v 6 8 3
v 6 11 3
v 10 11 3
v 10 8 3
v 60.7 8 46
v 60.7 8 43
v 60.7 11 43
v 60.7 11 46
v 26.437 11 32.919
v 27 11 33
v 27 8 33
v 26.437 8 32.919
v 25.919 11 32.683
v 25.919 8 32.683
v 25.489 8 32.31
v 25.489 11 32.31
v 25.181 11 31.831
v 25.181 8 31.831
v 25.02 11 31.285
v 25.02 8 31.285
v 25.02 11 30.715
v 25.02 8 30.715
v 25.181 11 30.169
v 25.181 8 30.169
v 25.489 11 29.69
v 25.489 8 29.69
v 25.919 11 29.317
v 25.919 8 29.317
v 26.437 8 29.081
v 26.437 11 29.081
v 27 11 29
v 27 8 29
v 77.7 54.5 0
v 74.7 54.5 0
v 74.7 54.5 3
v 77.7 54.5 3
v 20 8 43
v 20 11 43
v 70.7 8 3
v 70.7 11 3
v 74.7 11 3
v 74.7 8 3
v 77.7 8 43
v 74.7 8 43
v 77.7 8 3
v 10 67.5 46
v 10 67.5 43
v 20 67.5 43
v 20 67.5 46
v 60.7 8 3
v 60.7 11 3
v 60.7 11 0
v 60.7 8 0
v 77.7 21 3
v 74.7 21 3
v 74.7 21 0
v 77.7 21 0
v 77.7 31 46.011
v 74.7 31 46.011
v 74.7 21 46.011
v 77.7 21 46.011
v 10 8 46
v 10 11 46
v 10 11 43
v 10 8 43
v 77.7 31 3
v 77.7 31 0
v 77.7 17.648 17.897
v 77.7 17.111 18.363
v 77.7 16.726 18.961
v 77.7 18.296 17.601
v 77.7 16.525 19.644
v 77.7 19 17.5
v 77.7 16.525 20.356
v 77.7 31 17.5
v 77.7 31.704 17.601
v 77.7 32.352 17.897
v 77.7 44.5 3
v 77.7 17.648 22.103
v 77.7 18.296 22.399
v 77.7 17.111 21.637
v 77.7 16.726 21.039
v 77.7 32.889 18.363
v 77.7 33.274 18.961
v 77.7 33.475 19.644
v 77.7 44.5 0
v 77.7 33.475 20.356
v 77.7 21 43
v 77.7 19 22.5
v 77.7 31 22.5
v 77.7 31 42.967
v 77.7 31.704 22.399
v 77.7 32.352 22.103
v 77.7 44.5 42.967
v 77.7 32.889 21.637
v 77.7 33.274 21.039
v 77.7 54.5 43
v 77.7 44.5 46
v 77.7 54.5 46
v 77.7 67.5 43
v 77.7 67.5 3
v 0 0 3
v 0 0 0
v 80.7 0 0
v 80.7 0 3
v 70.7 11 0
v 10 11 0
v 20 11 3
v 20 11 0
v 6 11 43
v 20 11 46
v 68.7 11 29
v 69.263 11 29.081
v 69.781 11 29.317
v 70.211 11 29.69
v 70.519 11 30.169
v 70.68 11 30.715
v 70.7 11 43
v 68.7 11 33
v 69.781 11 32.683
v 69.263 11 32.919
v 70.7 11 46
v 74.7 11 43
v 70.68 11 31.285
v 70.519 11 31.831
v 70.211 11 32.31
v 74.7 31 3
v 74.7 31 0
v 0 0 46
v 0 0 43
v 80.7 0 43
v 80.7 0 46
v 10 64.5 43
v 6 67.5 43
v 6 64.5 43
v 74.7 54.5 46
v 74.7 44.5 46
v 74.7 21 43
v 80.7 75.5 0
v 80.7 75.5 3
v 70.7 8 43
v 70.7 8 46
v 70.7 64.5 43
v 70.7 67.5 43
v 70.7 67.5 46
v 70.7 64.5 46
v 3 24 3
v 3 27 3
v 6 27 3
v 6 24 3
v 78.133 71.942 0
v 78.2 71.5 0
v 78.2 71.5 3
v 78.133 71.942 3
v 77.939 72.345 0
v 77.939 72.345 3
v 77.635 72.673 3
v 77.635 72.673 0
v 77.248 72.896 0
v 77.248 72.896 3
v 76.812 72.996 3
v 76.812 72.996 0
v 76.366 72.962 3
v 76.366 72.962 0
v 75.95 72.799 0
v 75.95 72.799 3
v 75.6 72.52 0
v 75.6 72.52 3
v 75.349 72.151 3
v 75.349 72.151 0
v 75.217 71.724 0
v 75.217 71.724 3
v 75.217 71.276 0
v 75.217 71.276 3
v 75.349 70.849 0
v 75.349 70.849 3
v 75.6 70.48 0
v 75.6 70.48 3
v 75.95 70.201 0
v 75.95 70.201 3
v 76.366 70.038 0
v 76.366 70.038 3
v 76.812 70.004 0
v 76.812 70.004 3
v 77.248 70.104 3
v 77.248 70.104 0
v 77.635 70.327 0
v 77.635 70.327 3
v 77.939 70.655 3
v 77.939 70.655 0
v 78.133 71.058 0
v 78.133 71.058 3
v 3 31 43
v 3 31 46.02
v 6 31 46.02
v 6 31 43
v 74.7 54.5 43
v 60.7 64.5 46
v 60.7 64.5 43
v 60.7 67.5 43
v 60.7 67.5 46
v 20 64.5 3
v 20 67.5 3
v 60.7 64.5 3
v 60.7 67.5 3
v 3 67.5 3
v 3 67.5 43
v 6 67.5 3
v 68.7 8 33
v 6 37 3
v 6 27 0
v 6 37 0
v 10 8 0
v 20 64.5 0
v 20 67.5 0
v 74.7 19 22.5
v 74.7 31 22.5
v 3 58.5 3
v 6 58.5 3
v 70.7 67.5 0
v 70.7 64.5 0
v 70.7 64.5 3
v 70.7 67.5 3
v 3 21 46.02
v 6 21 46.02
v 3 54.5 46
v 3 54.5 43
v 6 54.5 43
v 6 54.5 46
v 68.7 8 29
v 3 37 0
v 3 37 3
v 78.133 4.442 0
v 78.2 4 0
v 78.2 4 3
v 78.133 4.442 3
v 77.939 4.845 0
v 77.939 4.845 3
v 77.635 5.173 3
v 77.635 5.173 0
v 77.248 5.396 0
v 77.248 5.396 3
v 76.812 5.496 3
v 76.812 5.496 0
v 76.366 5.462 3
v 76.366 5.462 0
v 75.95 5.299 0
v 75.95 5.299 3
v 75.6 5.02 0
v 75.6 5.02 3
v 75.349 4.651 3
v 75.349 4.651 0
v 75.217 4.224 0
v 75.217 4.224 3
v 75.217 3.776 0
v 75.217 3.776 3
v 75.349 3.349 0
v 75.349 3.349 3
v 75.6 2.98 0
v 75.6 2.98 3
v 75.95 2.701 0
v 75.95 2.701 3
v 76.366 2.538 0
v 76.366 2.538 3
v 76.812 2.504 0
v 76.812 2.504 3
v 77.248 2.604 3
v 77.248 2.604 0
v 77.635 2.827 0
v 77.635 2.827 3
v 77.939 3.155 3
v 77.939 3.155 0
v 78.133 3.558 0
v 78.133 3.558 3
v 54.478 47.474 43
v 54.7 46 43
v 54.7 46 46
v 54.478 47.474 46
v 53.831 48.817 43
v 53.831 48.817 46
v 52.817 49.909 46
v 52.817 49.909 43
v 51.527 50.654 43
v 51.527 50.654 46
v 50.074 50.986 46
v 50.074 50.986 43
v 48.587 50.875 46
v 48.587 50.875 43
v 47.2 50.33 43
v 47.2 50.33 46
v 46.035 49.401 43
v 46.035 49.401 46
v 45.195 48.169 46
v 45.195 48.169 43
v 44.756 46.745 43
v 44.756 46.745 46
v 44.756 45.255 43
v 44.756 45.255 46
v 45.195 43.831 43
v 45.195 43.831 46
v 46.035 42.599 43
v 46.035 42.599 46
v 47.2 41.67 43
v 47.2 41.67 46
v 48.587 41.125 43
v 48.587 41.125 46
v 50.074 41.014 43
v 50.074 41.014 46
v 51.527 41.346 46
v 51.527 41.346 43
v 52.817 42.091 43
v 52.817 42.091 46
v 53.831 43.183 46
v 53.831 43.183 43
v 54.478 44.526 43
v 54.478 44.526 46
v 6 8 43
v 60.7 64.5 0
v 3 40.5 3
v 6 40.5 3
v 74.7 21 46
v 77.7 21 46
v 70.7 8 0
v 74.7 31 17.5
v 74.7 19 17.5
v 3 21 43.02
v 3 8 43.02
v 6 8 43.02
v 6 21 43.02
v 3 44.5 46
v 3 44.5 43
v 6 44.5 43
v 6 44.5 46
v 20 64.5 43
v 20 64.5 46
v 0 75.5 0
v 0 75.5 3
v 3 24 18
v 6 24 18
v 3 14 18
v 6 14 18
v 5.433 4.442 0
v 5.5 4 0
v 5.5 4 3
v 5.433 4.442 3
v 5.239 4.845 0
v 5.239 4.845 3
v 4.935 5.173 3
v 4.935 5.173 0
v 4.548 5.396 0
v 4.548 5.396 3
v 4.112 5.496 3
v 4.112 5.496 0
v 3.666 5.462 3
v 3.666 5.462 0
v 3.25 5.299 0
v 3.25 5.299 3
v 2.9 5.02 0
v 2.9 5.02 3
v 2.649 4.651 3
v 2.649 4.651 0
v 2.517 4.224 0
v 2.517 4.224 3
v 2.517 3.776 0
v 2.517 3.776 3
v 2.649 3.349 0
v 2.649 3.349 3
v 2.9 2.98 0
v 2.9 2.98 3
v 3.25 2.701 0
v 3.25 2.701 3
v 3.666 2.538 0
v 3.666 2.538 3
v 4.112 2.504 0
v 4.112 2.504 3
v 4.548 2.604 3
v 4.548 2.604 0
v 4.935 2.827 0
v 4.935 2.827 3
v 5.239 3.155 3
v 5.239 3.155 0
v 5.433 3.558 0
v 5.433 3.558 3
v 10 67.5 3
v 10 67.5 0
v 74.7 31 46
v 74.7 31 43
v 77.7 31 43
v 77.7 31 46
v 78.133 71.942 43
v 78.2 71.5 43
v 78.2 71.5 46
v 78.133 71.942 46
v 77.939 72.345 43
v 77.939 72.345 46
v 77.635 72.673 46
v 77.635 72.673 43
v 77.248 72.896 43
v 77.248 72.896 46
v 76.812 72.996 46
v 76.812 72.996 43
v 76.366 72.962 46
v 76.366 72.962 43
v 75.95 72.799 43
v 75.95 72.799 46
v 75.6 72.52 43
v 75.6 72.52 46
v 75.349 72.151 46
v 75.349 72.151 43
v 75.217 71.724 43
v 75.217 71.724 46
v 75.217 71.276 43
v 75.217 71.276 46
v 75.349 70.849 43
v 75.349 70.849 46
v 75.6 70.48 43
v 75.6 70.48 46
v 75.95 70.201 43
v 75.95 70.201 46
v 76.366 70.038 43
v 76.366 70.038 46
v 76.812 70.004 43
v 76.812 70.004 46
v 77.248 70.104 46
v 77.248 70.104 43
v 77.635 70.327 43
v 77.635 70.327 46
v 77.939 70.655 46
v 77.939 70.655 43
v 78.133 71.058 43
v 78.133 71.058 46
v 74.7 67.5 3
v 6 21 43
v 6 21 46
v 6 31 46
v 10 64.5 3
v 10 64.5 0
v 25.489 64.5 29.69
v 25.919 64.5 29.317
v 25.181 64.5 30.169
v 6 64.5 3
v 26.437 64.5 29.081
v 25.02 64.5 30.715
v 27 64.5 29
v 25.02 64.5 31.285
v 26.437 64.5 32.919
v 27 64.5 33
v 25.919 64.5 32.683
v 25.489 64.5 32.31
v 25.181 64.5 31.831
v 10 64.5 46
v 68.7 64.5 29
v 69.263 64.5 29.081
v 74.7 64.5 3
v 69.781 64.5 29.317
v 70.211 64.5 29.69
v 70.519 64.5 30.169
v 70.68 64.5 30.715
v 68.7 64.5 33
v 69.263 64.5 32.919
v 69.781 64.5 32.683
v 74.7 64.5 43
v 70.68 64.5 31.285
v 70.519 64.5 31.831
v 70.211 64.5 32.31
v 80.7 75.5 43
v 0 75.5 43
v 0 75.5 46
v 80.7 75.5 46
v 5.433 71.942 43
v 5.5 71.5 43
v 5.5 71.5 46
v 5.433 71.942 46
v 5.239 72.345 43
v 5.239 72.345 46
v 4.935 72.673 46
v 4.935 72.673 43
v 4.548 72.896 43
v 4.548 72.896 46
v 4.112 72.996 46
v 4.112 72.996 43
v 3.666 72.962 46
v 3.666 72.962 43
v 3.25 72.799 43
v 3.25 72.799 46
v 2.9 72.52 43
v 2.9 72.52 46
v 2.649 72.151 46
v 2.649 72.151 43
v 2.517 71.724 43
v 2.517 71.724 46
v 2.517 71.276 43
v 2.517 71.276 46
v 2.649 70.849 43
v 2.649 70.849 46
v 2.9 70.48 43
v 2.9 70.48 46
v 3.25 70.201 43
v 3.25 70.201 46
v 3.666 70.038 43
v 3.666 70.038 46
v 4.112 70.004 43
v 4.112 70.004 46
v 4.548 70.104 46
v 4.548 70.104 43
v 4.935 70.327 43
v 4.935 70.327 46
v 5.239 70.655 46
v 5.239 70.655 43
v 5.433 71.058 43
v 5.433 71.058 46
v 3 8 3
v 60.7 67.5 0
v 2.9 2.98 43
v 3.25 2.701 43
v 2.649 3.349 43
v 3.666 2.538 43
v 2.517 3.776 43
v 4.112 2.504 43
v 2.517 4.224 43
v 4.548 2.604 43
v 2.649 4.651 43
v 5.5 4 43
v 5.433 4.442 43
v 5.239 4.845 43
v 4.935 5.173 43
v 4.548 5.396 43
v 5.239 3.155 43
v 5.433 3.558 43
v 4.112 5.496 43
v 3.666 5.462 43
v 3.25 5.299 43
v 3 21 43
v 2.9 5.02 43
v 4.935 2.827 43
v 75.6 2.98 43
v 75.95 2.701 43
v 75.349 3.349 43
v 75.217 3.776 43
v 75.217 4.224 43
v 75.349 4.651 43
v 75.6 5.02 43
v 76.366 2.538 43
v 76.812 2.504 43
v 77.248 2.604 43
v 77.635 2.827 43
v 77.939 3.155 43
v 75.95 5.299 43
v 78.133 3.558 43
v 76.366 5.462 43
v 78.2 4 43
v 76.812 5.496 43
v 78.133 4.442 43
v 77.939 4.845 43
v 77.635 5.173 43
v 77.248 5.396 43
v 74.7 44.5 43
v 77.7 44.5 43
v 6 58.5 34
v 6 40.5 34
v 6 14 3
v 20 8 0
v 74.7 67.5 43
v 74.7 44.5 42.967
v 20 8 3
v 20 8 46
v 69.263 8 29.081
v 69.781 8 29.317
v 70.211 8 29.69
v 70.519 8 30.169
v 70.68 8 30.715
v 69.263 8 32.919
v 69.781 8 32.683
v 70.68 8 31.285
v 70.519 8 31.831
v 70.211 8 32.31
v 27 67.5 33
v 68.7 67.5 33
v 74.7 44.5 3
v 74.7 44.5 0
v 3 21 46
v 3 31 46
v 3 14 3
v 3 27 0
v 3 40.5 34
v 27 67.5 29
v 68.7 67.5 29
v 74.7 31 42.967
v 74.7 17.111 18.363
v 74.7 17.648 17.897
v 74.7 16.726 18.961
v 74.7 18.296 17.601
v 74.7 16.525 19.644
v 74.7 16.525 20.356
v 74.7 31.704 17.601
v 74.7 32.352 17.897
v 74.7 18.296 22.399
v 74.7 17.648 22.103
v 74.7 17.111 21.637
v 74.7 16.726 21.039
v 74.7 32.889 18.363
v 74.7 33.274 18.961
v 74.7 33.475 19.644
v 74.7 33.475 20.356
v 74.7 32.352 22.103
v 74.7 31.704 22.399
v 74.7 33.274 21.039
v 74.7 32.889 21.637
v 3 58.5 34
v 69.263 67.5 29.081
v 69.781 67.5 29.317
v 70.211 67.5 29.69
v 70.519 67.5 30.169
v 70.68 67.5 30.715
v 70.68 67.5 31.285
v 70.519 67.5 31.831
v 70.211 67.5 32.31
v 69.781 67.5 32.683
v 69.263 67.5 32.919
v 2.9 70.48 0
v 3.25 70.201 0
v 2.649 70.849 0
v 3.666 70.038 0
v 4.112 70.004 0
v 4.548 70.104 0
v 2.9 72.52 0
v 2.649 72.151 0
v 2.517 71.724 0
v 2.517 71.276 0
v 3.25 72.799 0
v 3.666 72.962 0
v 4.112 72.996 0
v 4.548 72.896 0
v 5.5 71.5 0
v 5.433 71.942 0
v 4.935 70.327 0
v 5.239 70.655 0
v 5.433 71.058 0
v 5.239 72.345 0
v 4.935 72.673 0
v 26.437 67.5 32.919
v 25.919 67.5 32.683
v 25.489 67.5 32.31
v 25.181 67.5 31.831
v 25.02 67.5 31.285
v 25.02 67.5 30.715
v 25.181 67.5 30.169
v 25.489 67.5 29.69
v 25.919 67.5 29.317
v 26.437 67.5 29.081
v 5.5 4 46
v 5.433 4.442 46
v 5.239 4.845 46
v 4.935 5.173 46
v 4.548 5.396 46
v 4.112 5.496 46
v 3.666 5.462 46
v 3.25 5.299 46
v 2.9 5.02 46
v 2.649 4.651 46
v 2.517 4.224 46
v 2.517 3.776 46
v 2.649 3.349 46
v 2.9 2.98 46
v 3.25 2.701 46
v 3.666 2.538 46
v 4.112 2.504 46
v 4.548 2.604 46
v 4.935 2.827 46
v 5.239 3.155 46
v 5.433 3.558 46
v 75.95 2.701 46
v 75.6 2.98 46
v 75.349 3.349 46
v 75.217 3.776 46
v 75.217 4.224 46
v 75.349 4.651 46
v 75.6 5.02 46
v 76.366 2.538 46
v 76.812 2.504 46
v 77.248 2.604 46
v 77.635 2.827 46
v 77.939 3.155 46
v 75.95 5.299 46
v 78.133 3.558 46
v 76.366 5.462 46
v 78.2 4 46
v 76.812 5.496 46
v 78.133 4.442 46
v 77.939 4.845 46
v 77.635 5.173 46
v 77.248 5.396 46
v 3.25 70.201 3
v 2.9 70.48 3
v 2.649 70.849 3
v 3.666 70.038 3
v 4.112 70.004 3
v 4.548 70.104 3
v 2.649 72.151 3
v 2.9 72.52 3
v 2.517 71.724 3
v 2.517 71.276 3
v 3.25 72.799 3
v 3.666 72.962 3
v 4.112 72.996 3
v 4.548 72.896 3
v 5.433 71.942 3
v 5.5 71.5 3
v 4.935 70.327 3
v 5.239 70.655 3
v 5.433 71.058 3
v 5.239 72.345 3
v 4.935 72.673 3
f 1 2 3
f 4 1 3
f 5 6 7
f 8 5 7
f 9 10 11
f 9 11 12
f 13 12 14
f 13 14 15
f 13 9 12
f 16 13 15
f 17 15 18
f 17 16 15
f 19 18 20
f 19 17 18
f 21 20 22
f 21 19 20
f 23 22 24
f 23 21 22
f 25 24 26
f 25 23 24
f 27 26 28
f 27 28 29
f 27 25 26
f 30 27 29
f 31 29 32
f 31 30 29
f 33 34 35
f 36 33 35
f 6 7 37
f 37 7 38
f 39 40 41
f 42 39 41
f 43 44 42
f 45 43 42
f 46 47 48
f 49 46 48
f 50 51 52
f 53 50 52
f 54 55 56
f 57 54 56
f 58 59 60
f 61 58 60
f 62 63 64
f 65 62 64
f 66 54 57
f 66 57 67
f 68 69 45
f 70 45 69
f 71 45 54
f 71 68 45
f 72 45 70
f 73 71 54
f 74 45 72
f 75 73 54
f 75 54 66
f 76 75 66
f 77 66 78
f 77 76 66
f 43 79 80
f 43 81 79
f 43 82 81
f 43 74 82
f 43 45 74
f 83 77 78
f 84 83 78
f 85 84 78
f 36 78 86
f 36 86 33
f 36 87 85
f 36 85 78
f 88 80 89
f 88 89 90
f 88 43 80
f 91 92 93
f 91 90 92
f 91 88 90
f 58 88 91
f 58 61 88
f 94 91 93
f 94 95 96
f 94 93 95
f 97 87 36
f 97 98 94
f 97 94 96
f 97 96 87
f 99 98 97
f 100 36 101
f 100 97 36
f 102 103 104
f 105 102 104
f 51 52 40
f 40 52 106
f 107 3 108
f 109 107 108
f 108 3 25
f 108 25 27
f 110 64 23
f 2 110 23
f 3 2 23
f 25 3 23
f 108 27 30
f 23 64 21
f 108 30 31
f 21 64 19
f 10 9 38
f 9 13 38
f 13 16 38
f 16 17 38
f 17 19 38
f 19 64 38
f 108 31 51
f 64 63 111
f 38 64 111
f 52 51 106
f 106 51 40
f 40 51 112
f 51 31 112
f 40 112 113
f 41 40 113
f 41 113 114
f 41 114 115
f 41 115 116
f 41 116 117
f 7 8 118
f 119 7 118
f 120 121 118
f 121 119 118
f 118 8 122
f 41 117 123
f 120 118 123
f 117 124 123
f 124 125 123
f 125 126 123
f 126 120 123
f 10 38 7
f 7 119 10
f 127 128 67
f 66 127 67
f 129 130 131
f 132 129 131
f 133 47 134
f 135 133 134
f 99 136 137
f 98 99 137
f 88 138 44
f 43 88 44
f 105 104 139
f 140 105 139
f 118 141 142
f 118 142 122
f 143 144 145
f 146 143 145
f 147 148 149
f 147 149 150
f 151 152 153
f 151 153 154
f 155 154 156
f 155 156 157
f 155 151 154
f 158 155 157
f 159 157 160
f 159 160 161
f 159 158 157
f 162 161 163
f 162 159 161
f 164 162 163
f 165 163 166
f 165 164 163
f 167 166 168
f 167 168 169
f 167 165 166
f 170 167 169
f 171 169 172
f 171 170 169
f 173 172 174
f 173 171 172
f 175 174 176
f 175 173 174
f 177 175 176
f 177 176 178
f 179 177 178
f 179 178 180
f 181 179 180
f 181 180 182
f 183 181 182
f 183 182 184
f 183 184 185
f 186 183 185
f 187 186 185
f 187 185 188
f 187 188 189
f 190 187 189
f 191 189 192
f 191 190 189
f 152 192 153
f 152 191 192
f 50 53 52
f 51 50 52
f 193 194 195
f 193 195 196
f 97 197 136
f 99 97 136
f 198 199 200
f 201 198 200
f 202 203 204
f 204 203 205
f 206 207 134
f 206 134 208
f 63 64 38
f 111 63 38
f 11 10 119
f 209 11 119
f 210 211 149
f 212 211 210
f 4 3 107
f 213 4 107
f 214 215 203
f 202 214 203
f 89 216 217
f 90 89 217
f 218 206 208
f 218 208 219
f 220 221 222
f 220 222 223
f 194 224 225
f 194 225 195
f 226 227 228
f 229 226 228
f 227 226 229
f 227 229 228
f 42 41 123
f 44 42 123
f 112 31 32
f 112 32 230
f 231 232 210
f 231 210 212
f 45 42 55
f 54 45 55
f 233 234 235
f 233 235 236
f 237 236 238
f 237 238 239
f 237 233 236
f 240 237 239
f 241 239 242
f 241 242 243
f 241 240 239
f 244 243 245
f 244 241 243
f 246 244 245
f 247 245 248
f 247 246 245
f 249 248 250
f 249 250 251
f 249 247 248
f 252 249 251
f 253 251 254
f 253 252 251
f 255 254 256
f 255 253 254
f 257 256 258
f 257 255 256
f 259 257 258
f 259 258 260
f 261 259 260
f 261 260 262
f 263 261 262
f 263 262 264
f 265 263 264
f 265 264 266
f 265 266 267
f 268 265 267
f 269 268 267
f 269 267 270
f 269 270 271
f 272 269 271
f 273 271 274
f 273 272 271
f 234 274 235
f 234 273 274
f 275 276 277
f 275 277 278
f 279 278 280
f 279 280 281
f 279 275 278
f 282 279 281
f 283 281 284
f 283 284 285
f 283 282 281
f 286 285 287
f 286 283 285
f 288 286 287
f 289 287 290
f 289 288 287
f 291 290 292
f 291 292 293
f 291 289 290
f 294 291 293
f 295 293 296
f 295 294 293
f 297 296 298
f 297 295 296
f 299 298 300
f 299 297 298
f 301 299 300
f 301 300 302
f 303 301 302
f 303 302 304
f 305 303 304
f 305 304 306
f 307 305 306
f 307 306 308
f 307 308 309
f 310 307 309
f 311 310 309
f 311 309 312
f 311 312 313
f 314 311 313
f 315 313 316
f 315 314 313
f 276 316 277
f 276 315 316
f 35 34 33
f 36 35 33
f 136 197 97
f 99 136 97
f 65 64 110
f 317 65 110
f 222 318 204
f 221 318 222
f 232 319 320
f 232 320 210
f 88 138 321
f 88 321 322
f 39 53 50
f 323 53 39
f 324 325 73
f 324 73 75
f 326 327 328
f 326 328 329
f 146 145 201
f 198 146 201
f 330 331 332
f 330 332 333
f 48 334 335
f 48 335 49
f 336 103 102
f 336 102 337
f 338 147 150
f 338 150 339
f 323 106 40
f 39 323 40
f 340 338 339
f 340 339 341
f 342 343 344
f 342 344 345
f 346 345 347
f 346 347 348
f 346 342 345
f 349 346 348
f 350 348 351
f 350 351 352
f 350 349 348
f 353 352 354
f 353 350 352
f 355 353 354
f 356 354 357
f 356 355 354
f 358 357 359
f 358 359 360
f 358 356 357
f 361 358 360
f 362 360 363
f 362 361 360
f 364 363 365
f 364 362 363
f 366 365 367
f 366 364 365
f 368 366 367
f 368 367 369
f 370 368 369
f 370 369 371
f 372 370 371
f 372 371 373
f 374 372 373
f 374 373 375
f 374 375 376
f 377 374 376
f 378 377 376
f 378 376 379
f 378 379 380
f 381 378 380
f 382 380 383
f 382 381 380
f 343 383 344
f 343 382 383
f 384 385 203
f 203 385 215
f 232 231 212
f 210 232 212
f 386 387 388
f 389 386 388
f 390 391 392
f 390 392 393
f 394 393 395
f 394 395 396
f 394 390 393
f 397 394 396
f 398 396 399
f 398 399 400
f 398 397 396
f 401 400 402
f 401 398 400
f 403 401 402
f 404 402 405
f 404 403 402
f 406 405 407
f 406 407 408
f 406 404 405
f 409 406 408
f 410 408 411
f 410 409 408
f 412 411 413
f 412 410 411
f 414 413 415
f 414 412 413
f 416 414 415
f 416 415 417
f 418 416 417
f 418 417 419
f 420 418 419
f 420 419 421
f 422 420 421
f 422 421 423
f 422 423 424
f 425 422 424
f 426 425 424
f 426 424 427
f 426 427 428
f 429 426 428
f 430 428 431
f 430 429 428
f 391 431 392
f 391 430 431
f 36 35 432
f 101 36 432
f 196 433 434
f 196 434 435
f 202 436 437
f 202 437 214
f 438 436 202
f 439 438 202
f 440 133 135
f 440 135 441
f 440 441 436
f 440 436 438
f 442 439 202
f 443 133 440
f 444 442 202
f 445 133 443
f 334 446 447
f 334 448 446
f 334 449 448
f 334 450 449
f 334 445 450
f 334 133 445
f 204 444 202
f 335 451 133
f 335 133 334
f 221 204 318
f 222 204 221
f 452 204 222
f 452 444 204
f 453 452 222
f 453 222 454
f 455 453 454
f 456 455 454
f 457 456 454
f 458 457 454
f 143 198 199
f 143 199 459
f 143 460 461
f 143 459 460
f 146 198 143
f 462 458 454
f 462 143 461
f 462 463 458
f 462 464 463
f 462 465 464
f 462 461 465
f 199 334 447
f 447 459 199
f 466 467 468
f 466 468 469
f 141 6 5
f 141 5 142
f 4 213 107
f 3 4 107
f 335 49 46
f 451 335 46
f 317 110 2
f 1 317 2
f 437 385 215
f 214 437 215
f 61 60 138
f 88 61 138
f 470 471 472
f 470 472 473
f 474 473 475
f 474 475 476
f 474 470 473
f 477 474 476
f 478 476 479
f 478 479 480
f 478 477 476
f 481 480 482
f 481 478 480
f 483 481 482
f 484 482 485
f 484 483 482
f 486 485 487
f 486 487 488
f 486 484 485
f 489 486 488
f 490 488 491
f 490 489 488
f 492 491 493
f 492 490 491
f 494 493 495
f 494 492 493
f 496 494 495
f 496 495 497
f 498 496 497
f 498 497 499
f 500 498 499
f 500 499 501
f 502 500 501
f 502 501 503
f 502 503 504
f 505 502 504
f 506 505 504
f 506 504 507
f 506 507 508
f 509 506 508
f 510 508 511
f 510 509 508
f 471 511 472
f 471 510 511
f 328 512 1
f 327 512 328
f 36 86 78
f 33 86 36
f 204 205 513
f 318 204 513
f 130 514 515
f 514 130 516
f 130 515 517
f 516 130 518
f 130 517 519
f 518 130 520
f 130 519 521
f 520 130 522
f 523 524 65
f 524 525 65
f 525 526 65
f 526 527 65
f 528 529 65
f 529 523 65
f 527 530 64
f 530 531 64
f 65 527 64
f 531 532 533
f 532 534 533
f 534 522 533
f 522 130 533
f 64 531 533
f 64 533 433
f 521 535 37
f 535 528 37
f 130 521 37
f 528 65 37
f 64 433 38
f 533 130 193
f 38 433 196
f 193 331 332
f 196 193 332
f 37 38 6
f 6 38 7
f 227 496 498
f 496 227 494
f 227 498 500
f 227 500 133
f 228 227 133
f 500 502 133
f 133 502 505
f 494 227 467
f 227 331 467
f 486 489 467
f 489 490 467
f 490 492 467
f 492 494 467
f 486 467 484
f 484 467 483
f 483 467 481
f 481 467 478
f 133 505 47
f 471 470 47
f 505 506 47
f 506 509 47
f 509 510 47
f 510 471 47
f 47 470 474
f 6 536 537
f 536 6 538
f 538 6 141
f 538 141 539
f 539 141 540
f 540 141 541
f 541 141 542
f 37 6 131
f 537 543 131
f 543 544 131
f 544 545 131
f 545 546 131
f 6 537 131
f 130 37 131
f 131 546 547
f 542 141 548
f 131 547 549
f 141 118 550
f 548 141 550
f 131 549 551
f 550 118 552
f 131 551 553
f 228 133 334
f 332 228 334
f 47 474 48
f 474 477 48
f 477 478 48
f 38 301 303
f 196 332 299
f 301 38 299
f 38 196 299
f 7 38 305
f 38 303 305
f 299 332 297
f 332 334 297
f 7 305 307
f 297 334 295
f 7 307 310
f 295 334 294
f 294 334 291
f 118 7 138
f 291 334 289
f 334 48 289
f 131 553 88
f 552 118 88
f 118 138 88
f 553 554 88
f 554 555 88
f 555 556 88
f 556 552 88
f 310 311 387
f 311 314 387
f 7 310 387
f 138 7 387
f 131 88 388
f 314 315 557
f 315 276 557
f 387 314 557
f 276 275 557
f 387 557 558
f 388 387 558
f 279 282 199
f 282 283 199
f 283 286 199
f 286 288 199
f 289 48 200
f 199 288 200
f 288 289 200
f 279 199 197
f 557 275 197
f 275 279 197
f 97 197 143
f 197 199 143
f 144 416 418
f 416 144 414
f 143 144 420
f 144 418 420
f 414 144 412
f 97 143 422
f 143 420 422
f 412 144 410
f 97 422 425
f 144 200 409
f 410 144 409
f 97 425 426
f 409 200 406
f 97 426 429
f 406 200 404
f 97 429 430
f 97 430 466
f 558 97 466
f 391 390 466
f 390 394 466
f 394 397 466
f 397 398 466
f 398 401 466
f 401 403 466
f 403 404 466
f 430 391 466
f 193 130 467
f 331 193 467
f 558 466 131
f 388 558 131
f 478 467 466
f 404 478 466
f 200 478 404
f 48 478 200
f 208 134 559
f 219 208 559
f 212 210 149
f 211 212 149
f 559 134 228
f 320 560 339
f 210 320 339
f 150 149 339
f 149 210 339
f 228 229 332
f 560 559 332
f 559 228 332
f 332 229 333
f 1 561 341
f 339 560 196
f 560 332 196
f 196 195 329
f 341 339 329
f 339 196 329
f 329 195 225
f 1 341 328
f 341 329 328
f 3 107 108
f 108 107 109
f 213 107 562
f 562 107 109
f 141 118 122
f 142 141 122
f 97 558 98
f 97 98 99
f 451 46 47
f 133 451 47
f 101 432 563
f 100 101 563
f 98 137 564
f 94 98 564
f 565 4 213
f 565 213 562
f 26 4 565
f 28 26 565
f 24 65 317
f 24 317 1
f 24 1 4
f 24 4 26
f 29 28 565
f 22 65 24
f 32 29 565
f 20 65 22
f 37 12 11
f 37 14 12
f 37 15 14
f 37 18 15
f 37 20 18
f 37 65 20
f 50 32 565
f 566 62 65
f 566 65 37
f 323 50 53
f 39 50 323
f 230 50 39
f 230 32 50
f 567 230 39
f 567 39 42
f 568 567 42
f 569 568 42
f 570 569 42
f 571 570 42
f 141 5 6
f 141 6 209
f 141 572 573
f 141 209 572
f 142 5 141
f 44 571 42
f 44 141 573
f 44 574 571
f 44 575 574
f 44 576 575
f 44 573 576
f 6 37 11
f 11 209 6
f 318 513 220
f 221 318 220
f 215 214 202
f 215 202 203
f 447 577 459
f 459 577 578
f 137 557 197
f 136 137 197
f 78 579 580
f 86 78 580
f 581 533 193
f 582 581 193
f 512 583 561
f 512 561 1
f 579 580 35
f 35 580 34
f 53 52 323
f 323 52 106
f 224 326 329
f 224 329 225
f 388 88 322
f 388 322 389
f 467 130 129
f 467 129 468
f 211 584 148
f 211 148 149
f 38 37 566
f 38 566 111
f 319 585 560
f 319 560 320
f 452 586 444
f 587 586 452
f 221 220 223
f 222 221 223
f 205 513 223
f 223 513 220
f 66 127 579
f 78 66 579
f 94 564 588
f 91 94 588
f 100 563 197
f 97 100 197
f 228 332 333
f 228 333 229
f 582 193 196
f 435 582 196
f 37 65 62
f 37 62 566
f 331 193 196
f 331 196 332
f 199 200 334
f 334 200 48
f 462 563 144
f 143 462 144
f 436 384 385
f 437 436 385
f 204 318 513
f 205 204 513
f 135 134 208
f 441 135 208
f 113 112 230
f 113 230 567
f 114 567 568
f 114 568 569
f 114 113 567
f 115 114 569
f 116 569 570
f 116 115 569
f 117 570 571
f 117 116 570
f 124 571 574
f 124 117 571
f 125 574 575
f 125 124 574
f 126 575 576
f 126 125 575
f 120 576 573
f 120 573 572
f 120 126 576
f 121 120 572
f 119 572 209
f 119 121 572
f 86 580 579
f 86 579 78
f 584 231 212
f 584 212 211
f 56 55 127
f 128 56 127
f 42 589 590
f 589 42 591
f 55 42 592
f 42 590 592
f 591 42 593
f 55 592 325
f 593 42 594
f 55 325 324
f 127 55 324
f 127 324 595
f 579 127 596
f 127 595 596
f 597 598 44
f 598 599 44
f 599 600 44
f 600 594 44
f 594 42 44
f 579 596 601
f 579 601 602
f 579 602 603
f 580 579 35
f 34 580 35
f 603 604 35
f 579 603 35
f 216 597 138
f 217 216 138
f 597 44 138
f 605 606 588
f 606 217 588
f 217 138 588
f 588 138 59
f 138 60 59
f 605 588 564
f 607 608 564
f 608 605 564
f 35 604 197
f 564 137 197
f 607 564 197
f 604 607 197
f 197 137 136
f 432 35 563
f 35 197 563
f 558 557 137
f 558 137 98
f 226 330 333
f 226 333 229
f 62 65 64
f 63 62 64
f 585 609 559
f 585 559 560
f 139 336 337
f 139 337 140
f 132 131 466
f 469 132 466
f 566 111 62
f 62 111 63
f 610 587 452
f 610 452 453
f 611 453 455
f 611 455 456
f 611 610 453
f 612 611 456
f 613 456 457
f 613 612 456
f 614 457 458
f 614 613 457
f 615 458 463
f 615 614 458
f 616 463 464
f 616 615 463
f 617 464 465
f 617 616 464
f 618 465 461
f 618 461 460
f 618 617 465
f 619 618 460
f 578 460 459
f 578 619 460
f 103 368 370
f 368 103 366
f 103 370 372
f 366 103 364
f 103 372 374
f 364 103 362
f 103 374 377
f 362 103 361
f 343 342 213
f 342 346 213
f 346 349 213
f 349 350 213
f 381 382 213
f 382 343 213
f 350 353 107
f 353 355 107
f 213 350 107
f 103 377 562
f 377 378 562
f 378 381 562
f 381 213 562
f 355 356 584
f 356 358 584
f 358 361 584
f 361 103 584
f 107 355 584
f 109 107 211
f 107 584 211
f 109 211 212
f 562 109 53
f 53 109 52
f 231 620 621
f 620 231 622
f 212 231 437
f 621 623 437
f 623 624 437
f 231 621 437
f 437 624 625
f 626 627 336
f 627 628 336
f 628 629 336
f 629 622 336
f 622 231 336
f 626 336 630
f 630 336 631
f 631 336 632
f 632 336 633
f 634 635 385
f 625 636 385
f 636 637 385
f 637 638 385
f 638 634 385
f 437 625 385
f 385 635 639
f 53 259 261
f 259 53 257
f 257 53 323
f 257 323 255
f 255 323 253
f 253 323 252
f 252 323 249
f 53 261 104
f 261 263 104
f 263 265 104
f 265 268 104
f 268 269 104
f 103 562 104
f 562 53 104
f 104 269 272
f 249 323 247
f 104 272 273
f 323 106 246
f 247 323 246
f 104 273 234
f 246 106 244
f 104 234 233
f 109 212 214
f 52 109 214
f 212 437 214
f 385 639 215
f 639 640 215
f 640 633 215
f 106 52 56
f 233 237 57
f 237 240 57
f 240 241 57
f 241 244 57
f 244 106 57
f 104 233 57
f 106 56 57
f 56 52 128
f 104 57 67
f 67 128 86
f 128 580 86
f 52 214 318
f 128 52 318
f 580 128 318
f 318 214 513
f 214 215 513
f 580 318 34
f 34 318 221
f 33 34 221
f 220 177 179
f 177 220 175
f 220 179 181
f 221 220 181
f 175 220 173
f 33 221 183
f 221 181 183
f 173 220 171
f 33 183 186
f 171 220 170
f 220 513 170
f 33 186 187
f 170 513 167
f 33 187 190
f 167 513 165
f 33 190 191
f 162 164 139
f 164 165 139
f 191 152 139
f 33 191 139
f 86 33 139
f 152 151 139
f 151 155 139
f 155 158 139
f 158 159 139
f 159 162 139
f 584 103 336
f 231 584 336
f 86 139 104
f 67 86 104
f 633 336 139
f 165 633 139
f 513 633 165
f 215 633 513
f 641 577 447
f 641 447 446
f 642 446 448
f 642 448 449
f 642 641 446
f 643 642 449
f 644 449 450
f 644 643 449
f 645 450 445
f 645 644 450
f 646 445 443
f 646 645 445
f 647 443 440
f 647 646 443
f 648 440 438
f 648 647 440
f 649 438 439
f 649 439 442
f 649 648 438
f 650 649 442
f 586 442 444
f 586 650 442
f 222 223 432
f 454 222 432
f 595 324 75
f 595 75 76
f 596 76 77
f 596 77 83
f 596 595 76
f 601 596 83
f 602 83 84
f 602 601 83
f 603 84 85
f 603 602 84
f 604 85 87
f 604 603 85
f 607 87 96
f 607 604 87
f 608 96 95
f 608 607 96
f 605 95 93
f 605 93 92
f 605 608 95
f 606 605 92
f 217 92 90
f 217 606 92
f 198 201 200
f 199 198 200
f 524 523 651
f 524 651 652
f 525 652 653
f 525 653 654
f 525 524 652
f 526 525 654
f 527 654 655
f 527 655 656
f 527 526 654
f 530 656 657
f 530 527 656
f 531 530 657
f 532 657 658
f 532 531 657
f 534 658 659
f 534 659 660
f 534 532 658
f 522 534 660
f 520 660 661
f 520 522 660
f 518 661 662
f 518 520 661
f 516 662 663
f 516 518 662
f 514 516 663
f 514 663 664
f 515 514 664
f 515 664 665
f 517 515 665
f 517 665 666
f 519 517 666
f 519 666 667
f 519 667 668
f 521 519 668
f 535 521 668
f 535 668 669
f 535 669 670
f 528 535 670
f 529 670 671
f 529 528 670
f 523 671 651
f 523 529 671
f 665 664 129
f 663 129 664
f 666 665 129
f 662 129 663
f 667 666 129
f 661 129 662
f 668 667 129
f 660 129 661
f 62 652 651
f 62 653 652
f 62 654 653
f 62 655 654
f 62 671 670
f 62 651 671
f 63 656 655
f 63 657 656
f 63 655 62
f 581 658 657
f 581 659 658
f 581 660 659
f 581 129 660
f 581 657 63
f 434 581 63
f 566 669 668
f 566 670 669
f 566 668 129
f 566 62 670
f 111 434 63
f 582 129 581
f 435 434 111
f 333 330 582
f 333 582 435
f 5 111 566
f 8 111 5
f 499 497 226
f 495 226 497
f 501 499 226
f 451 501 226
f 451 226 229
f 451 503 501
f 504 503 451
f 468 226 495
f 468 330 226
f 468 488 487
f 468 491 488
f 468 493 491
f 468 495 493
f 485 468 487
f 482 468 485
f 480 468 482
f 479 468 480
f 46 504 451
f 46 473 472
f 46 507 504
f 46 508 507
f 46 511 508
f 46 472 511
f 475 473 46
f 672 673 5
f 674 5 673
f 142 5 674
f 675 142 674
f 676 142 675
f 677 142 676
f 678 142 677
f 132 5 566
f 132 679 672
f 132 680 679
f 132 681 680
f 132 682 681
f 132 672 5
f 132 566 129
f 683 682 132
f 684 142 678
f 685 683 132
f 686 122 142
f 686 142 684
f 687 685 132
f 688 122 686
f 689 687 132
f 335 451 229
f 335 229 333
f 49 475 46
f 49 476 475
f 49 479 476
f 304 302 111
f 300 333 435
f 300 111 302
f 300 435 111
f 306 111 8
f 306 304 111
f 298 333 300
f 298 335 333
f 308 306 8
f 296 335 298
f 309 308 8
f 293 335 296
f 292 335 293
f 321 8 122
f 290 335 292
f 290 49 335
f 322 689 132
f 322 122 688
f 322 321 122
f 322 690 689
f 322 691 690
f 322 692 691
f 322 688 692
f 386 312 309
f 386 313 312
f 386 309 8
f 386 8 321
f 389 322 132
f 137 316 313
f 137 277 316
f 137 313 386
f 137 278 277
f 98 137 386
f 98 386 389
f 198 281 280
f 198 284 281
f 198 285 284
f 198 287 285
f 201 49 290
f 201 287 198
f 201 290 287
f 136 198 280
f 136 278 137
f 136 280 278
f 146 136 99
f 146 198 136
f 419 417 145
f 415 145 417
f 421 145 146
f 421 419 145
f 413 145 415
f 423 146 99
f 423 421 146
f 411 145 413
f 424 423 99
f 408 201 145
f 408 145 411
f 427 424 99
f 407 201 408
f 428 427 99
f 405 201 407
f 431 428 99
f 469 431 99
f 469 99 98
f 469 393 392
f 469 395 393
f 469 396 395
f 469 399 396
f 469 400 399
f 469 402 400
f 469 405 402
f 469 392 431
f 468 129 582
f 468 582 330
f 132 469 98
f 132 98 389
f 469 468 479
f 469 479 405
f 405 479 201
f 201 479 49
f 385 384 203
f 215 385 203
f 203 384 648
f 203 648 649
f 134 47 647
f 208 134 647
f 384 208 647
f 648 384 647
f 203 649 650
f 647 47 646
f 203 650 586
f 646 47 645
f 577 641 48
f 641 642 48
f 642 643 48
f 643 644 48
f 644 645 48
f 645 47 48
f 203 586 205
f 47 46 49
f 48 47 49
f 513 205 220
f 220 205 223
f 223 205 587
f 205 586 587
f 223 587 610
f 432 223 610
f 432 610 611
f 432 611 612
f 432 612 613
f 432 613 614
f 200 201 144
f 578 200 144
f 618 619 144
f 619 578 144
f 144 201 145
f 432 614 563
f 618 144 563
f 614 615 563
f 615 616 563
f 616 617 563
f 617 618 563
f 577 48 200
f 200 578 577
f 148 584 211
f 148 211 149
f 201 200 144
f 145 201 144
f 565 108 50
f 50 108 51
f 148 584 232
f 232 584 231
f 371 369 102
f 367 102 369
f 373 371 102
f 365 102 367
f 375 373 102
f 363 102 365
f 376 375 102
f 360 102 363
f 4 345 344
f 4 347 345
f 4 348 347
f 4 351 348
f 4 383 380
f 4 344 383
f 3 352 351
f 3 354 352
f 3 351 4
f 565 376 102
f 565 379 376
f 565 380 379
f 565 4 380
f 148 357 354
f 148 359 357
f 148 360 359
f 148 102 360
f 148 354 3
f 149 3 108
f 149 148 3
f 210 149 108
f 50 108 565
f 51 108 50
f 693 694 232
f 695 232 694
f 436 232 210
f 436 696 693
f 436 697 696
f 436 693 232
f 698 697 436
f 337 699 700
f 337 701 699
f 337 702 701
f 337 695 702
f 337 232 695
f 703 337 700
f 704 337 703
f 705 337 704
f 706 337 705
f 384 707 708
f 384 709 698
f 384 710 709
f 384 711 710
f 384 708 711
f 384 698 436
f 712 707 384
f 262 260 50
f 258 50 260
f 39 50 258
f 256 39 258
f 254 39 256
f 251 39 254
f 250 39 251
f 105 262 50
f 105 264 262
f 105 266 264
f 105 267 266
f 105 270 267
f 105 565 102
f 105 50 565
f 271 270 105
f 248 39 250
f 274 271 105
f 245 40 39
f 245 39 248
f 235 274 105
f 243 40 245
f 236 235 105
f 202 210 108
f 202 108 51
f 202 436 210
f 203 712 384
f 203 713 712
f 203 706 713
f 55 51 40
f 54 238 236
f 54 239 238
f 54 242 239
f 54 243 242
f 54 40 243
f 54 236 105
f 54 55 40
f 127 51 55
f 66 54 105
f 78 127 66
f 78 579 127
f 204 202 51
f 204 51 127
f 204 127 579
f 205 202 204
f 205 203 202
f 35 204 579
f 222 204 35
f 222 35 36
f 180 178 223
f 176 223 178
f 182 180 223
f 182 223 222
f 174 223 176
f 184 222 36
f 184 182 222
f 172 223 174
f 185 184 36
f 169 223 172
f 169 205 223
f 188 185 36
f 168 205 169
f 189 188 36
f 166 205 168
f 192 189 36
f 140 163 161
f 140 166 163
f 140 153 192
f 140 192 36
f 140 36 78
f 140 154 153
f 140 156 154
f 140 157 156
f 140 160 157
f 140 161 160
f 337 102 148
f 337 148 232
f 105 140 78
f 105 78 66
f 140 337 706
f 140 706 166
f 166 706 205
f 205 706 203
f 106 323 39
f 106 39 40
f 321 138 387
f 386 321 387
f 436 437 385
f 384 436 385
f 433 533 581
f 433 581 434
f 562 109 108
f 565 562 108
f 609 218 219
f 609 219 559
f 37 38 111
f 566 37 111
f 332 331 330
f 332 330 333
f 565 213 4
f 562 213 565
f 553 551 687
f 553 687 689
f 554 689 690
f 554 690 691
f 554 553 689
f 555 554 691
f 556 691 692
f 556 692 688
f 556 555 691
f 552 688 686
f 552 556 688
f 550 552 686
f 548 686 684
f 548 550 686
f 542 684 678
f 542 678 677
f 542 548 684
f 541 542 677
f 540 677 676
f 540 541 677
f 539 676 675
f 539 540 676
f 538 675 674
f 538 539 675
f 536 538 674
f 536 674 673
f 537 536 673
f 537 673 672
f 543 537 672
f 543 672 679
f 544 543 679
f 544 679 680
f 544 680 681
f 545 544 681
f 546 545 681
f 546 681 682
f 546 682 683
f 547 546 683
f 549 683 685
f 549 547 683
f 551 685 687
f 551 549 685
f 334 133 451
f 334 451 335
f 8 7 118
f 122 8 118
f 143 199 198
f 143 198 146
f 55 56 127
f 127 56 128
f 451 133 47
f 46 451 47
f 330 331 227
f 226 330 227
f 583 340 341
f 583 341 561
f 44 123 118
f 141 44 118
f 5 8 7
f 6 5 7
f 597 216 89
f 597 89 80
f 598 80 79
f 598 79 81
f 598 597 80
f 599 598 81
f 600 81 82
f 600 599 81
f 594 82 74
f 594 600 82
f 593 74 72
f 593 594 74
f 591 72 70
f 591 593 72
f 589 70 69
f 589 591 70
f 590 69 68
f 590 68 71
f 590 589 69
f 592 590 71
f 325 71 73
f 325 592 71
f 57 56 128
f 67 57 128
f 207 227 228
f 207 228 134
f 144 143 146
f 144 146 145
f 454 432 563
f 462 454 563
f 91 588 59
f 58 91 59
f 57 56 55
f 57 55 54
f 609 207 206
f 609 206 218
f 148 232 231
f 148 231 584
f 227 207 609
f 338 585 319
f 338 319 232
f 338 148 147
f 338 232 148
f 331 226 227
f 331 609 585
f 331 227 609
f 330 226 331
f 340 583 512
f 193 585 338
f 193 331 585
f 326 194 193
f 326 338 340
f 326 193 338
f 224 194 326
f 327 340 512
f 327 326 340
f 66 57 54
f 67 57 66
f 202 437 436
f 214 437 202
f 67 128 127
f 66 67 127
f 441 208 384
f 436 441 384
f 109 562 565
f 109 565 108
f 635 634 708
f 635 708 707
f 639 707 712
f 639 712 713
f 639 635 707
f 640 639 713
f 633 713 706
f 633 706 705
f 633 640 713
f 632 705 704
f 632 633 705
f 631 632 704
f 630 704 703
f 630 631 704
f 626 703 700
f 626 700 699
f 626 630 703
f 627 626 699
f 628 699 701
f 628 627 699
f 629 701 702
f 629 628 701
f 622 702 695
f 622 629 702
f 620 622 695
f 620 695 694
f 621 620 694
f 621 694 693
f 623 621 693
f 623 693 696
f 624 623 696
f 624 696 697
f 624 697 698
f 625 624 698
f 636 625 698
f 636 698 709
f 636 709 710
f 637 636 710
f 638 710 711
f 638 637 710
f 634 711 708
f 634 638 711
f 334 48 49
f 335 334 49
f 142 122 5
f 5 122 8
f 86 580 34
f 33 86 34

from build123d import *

# Parameters (mm, degrees)
SKETCH_W      = 80.7
SKETCH_H      = 75.5
SKETCH_R      = 1.5
SKETCH_W_2    = 10
SKETCH_H_2    = 3
SKETCH_W_3    = 3
SKETCH_H_3    = 10
PAD_DEPTH     = 3
PAD001_DEPTH  = 3
PAD002_DEPTH  = 3
PAD003_DEPTH  = 3
SKETCH004_W   = 80.7
SKETCH004_H   = 75.5
SKETCH004_R   = 1.5
SKETCH004_R_2 = 5
SKETCH004_W_2 = 10
SKETCH004_H_2 = 3
SKETCH004_W_3 = 3
SKETCH004_H_3 = 10
PAD004_DEPTH  = 3
PAD005_DEPTH  = 3


with BuildPart() as bottom:
    # Sketch → Pad (new body)
    with BuildSketch(Plane.XY):
        with Locations((40.35, 37.75)):
            Rectangle(SKETCH_W, SKETCH_H)
        with Locations((4, 4)):
            Circle(SKETCH_R, mode=Mode.SUBTRACT)
        with Locations((4, 71.5)):
            Circle(SKETCH_R, mode=Mode.SUBTRACT)
        with Locations((76.7, 71.5)):
            Circle(SKETCH_R, mode=Mode.SUBTRACT)
        with Locations((76.7, 4)):
            Circle(SKETCH_R, mode=Mode.SUBTRACT)
        with Locations((15, 9.5)):
            Rectangle(SKETCH_W_2, SKETCH_H_2, mode=Mode.SUBTRACT)
        with Locations((4.5, 32)):
            Rectangle(SKETCH_W_3, SKETCH_H_3, mode=Mode.SUBTRACT)
        with Locations((15, 66)):
            Rectangle(SKETCH_W_2, SKETCH_H_2, mode=Mode.SUBTRACT)
        with Locations((76.2, 26)):
            Rectangle(SKETCH_W_3, SKETCH_H_3, mode=Mode.SUBTRACT)
        with Locations((65.7, 66)):
            Rectangle(SKETCH_W_2, SKETCH_H_2, mode=Mode.SUBTRACT)
        with Locations((65.7, 9.5)):
            Rectangle(SKETCH_W_2, SKETCH_H_2, mode=Mode.SUBTRACT)
        with Locations((76.2, 49.5)):
            Rectangle(SKETCH_W_3, SKETCH_H_3, mode=Mode.SUBTRACT)
    extrude(amount=PAD_DEPTH)


with BuildPart() as sider:
    # Sketch001 → Pad001 (new body)
    with BuildSketch(Plane.XZ.offset(-11)):
        Polygon((74.7, 3), (74.7, 43), (70.7, 43), (70.7, 46), (60.7, 46), (60.7, 43), (20, 43), (20, 46), (10, 46), (10, 43), (6, 43), (6, 3), (10, 3), (10, 0), (20, 0), (20, 3), (60.7, 3), (60.7, 0), (70.7, 0), (70.7, 3), align=None)
        with BuildLine():
            ThreePointArc((27, 33), (25, 31), (27, 29))
            Line((27, 29), (68.7, 29))
            ThreePointArc((68.7, 29), (70.7, 31), (68.7, 33))
            Line((27, 33), (68.7, 33))
        make_face(mode=Mode.SUBTRACT)
    extrude(amount=PAD001_DEPTH)


with BuildPart() as sidel:
    # Sketch002 → Pad002 (new body)
    with BuildSketch(Plane.XZ.offset(-11)):
        Polygon((74.7, 3), (74.7, 43), (70.7, 43), (70.7, 46), (60.7, 46), (60.7, 43), (20, 43), (20, 46), (10, 46), (10, 43), (6, 43), (6, 3), (10, 3), (10, 0), (20, 0), (20, 3), (60.7, 3), (60.7, 0), (70.7, 0), (70.7, 3), align=None)
        with BuildLine():
            ThreePointArc((27, 33), (25, 31), (27, 29))
            Line((27, 29), (68.7, 29))
            ThreePointArc((68.7, 29), (70.7, 31), (68.7, 33))
            Line((27, 33), (68.7, 33))
        make_face(mode=Mode.SUBTRACT)
    extrude(amount=PAD002_DEPTH)


with BuildPart() as sidel_1:
    # Body002 placement: moved
    add(sidel.part.moved(Location((0, 56.5, 0))))


with BuildPart() as back:
    # Sketch003 → Pad003 (new body)
    with BuildSketch(Plane.YZ.offset(74.7)):
        Polygon((8, 3), (21, 3), (21, 0), (31, 0), (31, 3), (44.5, 3), (44.5, 0), (54.5, 0), (54.5, 3), (67.5, 3), (67.5, 43), (54.5, 43), (54.5, 46), (44.5, 46), (44.5, 42.966816), (31, 42.966816), (31, 46.01099), (21, 46.01099), (21, 43), (8, 43), align=None)
        with BuildLine():
            ThreePointArc((19, 22.5), (16.5, 20), (19, 17.5))
            Line((19, 17.5), (31, 17.5))
            ThreePointArc((31, 17.5), (33.5, 20), (31, 22.5))
            Line((19, 22.5), (31, 22.5))
        make_face(mode=Mode.SUBTRACT)
    extrude(amount=PAD003_DEPTH)


with BuildPart() as top:
    # Sketch004 → Pad004 (new body)
    with BuildSketch(Plane.XY):
        with Locations((40.35, 37.75)):
            Rectangle(SKETCH004_W, SKETCH004_H)
        with Locations((4, 4)):
            Circle(SKETCH004_R, mode=Mode.SUBTRACT)
        with Locations((4, 71.5)):
            Circle(SKETCH004_R, mode=Mode.SUBTRACT)
        with Locations((76.7, 71.5)):
            Circle(SKETCH004_R, mode=Mode.SUBTRACT)
        with Locations((76.7, 4)):
            Circle(SKETCH004_R, mode=Mode.SUBTRACT)
        with Locations((49.7, 46)):
            Circle(SKETCH004_R_2, mode=Mode.SUBTRACT)
        with Locations((15, 9.5)):
            Rectangle(SKETCH004_W_2, SKETCH004_H_2, mode=Mode.SUBTRACT)
        with Locations((4.5, 26)):
            Rectangle(SKETCH004_W_3, SKETCH004_H_3, mode=Mode.SUBTRACT)
        with Locations((15, 66)):
            Rectangle(SKETCH004_W_2, SKETCH004_H_2, mode=Mode.SUBTRACT)
        with Locations((76.2, 26)):
            Rectangle(SKETCH004_W_3, SKETCH004_H_3, mode=Mode.SUBTRACT)
        with Locations((65.7, 66)):
            Rectangle(SKETCH004_W_2, SKETCH004_H_2, mode=Mode.SUBTRACT)
        with Locations((65.7, 9.5)):
            Rectangle(SKETCH004_W_2, SKETCH004_H_2, mode=Mode.SUBTRACT)
        with Locations((76.2, 49.5)):
            Rectangle(SKETCH004_W_3, SKETCH004_H_3, mode=Mode.SUBTRACT)
        with Locations((4.5, 49.5)):
            Rectangle(SKETCH004_W_3, SKETCH004_H_3, mode=Mode.SUBTRACT)
    extrude(amount=PAD004_DEPTH)


with BuildPart() as top_1:
    # Body004 placement: moved
    add(top.part.moved(Location((0, 0, 43))))


with BuildPart() as front:
    # Sketch005 → Pad005 (new body)
    with BuildSketch(Plane.YZ):
        Polygon((8, 3), (8, 43.020058), (21, 43.020058), (21, 46.020058), (31, 46.020058), (31, 43), (44.5, 43), (44.5, 46), (54.5, 46), (54.5, 43), (67.5, 43), (67.5, 3), (58.5, 3), (58.5, 34), (40.5, 34), (40.5, 3), (37, 3), (37, 0), (27, 0), (27, 3), (24, 3), (24, 18), (14, 18), (14, 3), align=None)
    extrude(amount=PAD005_DEPTH)


with BuildPart() as front_1:
    # Body005 placement: moved
    add(front.part.moved(Location((3, 0, 0))))


solid = Compound([bottom.part, sider.part, sidel_1.part, back.part, top_1.part, front_1.part])
